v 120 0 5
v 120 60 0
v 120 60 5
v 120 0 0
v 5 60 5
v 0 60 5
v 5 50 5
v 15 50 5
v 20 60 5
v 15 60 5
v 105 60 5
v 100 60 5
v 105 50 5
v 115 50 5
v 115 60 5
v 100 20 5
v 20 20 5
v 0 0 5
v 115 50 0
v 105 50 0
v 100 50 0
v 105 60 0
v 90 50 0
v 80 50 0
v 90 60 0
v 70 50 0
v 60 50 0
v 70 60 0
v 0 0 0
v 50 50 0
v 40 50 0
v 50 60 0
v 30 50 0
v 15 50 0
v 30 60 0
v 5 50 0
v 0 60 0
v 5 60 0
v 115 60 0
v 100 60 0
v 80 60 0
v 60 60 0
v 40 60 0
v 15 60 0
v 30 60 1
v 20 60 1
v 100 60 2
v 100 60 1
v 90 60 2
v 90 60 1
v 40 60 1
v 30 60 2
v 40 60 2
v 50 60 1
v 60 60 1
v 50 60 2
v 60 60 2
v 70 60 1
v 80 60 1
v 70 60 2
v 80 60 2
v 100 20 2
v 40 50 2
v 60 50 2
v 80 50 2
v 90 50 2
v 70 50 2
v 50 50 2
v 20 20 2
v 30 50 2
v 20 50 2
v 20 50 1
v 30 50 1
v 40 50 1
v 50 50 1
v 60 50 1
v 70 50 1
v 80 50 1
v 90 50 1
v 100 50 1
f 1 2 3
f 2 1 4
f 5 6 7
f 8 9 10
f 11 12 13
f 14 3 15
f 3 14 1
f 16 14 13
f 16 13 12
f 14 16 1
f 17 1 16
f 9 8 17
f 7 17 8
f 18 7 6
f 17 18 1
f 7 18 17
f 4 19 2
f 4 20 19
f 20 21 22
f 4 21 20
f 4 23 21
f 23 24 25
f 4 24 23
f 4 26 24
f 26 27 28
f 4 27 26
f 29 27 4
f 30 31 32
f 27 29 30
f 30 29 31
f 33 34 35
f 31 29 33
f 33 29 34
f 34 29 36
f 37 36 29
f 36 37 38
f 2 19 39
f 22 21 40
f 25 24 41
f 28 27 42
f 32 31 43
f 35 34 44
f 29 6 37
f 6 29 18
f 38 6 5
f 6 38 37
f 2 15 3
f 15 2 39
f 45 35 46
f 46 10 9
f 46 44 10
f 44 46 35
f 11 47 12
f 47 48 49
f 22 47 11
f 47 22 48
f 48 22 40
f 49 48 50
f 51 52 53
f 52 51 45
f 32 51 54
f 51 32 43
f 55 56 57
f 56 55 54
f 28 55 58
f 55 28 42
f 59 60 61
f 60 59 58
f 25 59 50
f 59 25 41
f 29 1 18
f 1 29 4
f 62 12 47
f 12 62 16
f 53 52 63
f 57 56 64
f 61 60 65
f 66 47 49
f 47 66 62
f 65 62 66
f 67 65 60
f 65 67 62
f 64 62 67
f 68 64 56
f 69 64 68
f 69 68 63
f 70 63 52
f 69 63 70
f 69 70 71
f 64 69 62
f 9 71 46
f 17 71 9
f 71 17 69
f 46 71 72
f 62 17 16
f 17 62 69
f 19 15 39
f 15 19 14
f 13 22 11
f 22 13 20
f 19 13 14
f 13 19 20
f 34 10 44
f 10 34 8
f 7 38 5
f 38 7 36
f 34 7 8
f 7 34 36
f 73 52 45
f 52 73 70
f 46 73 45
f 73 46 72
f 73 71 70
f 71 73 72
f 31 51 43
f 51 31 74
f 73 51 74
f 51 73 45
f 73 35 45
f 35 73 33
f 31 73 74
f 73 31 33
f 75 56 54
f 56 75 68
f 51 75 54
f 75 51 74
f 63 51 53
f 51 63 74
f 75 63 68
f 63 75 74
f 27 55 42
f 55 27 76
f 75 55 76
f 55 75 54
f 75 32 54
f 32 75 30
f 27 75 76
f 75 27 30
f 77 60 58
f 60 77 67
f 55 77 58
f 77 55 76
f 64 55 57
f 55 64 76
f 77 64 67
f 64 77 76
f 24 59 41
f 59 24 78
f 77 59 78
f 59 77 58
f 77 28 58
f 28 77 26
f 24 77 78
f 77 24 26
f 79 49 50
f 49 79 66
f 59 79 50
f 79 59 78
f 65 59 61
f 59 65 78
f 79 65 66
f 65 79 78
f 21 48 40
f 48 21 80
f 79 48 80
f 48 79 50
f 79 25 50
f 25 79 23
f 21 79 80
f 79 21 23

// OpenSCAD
difference(){
  cube ([120, 60, 5]);
  translate ([20, 20, 2]) cube ([80 ,80 ,20]);
	translate ([105, 50, -2]) cube ([10 ,20,20]);
	translate ([5, 50, -2]) cube ([10,15,20]);
translate ([20, 50, 1]) cube ([10 ,15 ,20]);
translate ([30, 50, -19]) cube ([10 ,15 ,20]);
translate ([40, 50, 1]) cube ([10 ,15 ,20]);
translate ([50, 50, -19]) cube ([10 ,15 ,20]);
translate ([60, 50, 1]) cube ([10 ,15 ,20]);
translate ([70, 50, -19]) cube ([10 ,15 ,20]);
translate ([80, 50, 1]) cube ([10 ,15 ,20]);
translate ([90, 50, -19]) cube ([10 ,15 ,20]);
 }
